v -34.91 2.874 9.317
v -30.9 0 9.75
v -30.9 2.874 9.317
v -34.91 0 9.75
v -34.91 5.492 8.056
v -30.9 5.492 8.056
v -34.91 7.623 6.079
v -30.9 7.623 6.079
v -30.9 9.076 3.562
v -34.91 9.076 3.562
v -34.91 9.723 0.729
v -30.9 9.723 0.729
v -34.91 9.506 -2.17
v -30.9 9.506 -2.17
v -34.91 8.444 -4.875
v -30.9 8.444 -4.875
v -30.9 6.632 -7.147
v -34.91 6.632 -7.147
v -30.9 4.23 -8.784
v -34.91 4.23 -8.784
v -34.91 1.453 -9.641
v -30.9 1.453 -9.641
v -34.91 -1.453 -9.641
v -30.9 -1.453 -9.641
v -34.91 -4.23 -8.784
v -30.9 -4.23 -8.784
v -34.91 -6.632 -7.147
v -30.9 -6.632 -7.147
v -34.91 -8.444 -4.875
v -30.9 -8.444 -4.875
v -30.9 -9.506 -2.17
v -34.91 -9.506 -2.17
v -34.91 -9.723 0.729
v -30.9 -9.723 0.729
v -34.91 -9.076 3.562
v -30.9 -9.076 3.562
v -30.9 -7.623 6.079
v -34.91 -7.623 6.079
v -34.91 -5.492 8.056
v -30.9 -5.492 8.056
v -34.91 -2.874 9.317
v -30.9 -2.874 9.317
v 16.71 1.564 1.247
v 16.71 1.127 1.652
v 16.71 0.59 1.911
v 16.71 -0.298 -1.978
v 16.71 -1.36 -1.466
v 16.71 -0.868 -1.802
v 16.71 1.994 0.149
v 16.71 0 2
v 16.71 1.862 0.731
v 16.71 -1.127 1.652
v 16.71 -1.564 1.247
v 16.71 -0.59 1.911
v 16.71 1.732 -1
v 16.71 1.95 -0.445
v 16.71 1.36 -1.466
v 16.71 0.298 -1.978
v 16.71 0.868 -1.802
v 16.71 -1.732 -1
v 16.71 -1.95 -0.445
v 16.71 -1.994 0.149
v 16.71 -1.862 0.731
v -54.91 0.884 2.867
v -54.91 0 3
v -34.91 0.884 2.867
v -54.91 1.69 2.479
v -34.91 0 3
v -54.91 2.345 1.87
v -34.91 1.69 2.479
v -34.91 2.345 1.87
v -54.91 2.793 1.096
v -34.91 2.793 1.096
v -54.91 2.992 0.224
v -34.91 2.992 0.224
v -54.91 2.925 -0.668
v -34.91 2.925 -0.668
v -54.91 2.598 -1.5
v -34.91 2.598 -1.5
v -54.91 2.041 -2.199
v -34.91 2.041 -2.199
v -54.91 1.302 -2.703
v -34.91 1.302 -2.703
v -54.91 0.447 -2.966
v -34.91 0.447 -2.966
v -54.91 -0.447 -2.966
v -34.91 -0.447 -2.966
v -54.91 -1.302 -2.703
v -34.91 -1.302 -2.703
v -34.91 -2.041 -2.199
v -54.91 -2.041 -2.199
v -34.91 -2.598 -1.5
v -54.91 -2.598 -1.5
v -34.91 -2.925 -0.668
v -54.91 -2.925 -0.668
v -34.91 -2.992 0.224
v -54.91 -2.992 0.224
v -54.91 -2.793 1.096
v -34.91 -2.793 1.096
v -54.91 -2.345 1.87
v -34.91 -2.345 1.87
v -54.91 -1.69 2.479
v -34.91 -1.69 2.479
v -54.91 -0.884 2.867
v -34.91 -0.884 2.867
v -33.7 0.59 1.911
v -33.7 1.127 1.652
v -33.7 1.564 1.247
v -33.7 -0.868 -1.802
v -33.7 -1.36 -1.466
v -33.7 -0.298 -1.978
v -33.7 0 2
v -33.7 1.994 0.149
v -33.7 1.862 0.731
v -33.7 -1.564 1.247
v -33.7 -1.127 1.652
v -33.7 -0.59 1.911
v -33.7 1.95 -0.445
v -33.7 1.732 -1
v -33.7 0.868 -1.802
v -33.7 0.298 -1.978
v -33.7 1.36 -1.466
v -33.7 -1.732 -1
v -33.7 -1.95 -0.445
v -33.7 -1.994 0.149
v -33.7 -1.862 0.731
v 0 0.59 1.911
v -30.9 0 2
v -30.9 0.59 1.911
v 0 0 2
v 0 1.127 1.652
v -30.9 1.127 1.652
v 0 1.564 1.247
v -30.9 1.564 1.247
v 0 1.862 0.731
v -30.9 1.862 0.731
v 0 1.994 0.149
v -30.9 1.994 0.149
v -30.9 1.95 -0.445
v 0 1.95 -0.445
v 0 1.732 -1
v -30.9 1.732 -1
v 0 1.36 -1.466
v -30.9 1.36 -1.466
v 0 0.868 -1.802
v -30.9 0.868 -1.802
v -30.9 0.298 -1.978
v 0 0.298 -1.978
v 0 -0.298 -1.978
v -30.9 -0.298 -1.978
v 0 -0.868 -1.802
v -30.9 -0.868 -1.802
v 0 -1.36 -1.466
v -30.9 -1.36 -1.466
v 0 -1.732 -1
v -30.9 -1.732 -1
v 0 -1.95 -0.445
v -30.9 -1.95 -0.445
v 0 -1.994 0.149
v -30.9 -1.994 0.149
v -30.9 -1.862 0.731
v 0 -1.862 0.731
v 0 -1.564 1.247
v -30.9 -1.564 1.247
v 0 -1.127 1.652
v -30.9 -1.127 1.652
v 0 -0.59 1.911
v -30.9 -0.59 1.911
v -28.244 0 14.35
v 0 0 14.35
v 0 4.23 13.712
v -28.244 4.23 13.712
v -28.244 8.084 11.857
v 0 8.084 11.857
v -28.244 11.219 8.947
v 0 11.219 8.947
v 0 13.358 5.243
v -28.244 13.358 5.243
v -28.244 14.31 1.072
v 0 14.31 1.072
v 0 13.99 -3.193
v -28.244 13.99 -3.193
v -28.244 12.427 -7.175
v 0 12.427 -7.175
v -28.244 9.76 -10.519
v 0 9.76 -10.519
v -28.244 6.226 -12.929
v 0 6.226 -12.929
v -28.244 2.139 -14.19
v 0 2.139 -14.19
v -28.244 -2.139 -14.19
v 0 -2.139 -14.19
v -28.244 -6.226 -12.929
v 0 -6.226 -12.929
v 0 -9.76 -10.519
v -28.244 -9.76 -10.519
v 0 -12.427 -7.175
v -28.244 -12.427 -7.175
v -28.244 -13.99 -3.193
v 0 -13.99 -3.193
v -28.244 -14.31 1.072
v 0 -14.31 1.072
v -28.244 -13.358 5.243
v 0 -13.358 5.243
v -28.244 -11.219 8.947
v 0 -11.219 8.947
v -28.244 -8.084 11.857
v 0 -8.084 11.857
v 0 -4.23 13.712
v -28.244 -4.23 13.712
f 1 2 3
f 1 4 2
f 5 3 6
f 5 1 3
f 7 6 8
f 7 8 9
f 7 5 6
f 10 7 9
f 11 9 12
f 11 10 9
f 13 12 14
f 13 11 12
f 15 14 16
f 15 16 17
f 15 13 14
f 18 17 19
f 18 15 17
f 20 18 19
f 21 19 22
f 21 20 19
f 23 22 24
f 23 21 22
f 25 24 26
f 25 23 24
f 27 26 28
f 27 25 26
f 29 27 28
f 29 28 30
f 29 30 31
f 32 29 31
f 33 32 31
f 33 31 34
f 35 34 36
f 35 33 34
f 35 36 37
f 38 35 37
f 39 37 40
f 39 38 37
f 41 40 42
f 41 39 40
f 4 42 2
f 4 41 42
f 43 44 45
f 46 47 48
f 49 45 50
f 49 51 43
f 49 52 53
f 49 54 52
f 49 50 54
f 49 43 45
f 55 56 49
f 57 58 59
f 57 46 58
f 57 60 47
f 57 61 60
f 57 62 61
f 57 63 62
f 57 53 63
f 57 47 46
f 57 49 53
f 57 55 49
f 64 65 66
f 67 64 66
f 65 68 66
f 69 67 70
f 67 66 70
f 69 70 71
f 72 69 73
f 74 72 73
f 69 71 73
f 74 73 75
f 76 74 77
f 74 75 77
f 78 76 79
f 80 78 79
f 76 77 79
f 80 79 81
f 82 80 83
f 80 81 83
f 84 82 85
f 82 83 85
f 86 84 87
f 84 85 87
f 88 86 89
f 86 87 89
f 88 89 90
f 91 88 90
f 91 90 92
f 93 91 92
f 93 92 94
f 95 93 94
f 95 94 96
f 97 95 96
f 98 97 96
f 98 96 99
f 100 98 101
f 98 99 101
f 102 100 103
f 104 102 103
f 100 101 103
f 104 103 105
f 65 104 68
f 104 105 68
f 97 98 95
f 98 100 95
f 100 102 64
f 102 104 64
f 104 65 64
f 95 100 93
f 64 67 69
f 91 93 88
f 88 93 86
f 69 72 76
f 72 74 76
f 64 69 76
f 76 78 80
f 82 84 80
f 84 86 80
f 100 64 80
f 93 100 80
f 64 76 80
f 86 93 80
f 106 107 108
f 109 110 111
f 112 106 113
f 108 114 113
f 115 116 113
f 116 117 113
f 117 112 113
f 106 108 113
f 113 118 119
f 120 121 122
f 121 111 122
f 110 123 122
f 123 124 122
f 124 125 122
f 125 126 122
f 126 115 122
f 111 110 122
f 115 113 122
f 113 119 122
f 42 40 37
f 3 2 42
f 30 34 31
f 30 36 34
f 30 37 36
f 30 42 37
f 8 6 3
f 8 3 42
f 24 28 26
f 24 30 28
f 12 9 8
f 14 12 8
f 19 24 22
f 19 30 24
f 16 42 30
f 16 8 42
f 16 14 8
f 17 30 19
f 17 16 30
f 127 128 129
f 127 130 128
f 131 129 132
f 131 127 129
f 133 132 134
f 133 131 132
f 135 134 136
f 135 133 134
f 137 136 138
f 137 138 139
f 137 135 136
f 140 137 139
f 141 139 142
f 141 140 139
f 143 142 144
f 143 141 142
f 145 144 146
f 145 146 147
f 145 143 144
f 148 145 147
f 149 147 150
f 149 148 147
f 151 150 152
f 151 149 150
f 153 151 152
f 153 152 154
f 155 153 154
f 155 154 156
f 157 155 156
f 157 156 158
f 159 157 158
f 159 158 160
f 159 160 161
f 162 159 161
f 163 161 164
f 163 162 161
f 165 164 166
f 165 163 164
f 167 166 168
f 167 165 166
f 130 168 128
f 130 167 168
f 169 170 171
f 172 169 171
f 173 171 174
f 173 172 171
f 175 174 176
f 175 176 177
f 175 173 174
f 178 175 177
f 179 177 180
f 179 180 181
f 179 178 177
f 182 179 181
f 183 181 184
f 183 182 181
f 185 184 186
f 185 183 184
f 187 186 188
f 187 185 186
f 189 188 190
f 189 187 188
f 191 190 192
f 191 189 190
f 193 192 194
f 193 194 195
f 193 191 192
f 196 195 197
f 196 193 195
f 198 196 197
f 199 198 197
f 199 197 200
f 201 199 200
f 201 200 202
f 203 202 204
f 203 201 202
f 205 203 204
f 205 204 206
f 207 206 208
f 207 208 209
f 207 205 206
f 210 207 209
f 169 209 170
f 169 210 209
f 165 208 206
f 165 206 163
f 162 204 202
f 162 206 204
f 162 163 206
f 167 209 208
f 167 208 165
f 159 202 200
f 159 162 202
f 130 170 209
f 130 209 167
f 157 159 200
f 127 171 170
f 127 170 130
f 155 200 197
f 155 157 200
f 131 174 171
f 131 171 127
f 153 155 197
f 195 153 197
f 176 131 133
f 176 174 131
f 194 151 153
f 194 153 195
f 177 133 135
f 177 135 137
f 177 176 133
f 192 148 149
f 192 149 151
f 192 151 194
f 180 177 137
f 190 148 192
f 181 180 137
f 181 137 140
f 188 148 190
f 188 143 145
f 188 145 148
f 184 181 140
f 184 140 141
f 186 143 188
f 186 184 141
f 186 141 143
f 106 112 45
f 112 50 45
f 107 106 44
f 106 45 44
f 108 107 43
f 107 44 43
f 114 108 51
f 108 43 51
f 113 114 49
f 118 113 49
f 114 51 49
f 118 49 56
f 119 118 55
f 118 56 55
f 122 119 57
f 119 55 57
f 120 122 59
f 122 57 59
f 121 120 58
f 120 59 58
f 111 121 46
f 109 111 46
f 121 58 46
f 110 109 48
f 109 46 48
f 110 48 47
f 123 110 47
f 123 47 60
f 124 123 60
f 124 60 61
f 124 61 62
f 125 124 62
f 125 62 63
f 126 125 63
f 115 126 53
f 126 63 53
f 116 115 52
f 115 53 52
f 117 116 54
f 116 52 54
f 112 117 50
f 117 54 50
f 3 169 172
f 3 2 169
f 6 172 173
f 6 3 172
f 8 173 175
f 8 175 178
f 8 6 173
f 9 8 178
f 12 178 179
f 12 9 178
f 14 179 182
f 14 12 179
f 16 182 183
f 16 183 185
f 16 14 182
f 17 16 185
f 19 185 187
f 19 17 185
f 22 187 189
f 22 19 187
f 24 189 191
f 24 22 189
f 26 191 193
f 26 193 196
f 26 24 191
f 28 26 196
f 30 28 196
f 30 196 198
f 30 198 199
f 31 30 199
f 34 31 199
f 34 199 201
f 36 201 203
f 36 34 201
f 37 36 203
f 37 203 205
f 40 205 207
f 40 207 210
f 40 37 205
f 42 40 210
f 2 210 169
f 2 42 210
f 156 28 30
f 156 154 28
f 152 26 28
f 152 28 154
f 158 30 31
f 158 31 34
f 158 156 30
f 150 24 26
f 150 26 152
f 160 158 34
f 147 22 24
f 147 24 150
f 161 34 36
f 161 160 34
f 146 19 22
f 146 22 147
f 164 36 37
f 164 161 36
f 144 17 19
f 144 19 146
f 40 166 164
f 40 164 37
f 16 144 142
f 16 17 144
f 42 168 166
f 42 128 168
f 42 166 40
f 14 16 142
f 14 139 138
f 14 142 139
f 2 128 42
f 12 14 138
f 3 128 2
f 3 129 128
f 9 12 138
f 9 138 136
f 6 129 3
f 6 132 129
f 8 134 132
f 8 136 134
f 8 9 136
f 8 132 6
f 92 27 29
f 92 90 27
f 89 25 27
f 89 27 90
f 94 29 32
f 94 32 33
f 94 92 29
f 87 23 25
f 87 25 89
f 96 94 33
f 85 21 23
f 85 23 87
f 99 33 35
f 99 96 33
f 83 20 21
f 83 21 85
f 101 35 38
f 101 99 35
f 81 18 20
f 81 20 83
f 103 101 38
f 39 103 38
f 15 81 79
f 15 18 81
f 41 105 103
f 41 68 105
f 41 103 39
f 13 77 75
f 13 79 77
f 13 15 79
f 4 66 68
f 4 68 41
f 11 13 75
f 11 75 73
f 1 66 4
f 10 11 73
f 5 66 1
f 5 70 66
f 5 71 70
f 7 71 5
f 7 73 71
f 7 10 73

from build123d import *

# Parameters (mm, degrees)
F1_W = 16.71
F1_H = 2
F2_W = 50.41
F2_H = 2
F3_W = 20
F3_H = 3


with BuildPart() as f4:
    # F1 (on Front) → F4 (revolve)
    with BuildSketch(Plane.XZ):
        with Locations((8.355, 1)):
            Rectangle(F1_W, F1_H)
    revolve(axis=Axis((-19.1, 0, 0), (-1, 0, 0)))

    # F2 (on Front) → F5 (revolve)
    with BuildSketch(Plane.XZ):
        with Locations((-8.495, 1)):
            Rectangle(F2_W, F2_H)
    revolve(axis=Axis((-19.1, 0, 0), (-1, 0, 0)))


with BuildPart() as f4b:
    # F1 (on Front) → F4, piece 2 (revolve)
    with BuildSketch(Plane.XZ):
        Polygon((0, 14.35), (-28.2441887617, 14.35), (-30.9, 9.75), (-30.9, 2), (0, 2), align=None)
    revolve(axis=Axis((-19.1, 0, 0), (-1, 0, 0)))


with BuildPart() as f6:
    # F3 (on Front) → F6 (revolve)
    with BuildSketch(Plane.XZ):
        with Locations((-44.91, 1.5)):
            Rectangle(F3_W, F3_H)
        Polygon((-30.9, 9.75), (-34.91, 9.75), (-34.91, 3), (-34.91, 0), (-30.9, 0), align=None)
    revolve(axis=Axis((-19.1, 0, 0), (-1, 0, 0)))


solid = Compound([f4.part, f4b.part, f6.part])
